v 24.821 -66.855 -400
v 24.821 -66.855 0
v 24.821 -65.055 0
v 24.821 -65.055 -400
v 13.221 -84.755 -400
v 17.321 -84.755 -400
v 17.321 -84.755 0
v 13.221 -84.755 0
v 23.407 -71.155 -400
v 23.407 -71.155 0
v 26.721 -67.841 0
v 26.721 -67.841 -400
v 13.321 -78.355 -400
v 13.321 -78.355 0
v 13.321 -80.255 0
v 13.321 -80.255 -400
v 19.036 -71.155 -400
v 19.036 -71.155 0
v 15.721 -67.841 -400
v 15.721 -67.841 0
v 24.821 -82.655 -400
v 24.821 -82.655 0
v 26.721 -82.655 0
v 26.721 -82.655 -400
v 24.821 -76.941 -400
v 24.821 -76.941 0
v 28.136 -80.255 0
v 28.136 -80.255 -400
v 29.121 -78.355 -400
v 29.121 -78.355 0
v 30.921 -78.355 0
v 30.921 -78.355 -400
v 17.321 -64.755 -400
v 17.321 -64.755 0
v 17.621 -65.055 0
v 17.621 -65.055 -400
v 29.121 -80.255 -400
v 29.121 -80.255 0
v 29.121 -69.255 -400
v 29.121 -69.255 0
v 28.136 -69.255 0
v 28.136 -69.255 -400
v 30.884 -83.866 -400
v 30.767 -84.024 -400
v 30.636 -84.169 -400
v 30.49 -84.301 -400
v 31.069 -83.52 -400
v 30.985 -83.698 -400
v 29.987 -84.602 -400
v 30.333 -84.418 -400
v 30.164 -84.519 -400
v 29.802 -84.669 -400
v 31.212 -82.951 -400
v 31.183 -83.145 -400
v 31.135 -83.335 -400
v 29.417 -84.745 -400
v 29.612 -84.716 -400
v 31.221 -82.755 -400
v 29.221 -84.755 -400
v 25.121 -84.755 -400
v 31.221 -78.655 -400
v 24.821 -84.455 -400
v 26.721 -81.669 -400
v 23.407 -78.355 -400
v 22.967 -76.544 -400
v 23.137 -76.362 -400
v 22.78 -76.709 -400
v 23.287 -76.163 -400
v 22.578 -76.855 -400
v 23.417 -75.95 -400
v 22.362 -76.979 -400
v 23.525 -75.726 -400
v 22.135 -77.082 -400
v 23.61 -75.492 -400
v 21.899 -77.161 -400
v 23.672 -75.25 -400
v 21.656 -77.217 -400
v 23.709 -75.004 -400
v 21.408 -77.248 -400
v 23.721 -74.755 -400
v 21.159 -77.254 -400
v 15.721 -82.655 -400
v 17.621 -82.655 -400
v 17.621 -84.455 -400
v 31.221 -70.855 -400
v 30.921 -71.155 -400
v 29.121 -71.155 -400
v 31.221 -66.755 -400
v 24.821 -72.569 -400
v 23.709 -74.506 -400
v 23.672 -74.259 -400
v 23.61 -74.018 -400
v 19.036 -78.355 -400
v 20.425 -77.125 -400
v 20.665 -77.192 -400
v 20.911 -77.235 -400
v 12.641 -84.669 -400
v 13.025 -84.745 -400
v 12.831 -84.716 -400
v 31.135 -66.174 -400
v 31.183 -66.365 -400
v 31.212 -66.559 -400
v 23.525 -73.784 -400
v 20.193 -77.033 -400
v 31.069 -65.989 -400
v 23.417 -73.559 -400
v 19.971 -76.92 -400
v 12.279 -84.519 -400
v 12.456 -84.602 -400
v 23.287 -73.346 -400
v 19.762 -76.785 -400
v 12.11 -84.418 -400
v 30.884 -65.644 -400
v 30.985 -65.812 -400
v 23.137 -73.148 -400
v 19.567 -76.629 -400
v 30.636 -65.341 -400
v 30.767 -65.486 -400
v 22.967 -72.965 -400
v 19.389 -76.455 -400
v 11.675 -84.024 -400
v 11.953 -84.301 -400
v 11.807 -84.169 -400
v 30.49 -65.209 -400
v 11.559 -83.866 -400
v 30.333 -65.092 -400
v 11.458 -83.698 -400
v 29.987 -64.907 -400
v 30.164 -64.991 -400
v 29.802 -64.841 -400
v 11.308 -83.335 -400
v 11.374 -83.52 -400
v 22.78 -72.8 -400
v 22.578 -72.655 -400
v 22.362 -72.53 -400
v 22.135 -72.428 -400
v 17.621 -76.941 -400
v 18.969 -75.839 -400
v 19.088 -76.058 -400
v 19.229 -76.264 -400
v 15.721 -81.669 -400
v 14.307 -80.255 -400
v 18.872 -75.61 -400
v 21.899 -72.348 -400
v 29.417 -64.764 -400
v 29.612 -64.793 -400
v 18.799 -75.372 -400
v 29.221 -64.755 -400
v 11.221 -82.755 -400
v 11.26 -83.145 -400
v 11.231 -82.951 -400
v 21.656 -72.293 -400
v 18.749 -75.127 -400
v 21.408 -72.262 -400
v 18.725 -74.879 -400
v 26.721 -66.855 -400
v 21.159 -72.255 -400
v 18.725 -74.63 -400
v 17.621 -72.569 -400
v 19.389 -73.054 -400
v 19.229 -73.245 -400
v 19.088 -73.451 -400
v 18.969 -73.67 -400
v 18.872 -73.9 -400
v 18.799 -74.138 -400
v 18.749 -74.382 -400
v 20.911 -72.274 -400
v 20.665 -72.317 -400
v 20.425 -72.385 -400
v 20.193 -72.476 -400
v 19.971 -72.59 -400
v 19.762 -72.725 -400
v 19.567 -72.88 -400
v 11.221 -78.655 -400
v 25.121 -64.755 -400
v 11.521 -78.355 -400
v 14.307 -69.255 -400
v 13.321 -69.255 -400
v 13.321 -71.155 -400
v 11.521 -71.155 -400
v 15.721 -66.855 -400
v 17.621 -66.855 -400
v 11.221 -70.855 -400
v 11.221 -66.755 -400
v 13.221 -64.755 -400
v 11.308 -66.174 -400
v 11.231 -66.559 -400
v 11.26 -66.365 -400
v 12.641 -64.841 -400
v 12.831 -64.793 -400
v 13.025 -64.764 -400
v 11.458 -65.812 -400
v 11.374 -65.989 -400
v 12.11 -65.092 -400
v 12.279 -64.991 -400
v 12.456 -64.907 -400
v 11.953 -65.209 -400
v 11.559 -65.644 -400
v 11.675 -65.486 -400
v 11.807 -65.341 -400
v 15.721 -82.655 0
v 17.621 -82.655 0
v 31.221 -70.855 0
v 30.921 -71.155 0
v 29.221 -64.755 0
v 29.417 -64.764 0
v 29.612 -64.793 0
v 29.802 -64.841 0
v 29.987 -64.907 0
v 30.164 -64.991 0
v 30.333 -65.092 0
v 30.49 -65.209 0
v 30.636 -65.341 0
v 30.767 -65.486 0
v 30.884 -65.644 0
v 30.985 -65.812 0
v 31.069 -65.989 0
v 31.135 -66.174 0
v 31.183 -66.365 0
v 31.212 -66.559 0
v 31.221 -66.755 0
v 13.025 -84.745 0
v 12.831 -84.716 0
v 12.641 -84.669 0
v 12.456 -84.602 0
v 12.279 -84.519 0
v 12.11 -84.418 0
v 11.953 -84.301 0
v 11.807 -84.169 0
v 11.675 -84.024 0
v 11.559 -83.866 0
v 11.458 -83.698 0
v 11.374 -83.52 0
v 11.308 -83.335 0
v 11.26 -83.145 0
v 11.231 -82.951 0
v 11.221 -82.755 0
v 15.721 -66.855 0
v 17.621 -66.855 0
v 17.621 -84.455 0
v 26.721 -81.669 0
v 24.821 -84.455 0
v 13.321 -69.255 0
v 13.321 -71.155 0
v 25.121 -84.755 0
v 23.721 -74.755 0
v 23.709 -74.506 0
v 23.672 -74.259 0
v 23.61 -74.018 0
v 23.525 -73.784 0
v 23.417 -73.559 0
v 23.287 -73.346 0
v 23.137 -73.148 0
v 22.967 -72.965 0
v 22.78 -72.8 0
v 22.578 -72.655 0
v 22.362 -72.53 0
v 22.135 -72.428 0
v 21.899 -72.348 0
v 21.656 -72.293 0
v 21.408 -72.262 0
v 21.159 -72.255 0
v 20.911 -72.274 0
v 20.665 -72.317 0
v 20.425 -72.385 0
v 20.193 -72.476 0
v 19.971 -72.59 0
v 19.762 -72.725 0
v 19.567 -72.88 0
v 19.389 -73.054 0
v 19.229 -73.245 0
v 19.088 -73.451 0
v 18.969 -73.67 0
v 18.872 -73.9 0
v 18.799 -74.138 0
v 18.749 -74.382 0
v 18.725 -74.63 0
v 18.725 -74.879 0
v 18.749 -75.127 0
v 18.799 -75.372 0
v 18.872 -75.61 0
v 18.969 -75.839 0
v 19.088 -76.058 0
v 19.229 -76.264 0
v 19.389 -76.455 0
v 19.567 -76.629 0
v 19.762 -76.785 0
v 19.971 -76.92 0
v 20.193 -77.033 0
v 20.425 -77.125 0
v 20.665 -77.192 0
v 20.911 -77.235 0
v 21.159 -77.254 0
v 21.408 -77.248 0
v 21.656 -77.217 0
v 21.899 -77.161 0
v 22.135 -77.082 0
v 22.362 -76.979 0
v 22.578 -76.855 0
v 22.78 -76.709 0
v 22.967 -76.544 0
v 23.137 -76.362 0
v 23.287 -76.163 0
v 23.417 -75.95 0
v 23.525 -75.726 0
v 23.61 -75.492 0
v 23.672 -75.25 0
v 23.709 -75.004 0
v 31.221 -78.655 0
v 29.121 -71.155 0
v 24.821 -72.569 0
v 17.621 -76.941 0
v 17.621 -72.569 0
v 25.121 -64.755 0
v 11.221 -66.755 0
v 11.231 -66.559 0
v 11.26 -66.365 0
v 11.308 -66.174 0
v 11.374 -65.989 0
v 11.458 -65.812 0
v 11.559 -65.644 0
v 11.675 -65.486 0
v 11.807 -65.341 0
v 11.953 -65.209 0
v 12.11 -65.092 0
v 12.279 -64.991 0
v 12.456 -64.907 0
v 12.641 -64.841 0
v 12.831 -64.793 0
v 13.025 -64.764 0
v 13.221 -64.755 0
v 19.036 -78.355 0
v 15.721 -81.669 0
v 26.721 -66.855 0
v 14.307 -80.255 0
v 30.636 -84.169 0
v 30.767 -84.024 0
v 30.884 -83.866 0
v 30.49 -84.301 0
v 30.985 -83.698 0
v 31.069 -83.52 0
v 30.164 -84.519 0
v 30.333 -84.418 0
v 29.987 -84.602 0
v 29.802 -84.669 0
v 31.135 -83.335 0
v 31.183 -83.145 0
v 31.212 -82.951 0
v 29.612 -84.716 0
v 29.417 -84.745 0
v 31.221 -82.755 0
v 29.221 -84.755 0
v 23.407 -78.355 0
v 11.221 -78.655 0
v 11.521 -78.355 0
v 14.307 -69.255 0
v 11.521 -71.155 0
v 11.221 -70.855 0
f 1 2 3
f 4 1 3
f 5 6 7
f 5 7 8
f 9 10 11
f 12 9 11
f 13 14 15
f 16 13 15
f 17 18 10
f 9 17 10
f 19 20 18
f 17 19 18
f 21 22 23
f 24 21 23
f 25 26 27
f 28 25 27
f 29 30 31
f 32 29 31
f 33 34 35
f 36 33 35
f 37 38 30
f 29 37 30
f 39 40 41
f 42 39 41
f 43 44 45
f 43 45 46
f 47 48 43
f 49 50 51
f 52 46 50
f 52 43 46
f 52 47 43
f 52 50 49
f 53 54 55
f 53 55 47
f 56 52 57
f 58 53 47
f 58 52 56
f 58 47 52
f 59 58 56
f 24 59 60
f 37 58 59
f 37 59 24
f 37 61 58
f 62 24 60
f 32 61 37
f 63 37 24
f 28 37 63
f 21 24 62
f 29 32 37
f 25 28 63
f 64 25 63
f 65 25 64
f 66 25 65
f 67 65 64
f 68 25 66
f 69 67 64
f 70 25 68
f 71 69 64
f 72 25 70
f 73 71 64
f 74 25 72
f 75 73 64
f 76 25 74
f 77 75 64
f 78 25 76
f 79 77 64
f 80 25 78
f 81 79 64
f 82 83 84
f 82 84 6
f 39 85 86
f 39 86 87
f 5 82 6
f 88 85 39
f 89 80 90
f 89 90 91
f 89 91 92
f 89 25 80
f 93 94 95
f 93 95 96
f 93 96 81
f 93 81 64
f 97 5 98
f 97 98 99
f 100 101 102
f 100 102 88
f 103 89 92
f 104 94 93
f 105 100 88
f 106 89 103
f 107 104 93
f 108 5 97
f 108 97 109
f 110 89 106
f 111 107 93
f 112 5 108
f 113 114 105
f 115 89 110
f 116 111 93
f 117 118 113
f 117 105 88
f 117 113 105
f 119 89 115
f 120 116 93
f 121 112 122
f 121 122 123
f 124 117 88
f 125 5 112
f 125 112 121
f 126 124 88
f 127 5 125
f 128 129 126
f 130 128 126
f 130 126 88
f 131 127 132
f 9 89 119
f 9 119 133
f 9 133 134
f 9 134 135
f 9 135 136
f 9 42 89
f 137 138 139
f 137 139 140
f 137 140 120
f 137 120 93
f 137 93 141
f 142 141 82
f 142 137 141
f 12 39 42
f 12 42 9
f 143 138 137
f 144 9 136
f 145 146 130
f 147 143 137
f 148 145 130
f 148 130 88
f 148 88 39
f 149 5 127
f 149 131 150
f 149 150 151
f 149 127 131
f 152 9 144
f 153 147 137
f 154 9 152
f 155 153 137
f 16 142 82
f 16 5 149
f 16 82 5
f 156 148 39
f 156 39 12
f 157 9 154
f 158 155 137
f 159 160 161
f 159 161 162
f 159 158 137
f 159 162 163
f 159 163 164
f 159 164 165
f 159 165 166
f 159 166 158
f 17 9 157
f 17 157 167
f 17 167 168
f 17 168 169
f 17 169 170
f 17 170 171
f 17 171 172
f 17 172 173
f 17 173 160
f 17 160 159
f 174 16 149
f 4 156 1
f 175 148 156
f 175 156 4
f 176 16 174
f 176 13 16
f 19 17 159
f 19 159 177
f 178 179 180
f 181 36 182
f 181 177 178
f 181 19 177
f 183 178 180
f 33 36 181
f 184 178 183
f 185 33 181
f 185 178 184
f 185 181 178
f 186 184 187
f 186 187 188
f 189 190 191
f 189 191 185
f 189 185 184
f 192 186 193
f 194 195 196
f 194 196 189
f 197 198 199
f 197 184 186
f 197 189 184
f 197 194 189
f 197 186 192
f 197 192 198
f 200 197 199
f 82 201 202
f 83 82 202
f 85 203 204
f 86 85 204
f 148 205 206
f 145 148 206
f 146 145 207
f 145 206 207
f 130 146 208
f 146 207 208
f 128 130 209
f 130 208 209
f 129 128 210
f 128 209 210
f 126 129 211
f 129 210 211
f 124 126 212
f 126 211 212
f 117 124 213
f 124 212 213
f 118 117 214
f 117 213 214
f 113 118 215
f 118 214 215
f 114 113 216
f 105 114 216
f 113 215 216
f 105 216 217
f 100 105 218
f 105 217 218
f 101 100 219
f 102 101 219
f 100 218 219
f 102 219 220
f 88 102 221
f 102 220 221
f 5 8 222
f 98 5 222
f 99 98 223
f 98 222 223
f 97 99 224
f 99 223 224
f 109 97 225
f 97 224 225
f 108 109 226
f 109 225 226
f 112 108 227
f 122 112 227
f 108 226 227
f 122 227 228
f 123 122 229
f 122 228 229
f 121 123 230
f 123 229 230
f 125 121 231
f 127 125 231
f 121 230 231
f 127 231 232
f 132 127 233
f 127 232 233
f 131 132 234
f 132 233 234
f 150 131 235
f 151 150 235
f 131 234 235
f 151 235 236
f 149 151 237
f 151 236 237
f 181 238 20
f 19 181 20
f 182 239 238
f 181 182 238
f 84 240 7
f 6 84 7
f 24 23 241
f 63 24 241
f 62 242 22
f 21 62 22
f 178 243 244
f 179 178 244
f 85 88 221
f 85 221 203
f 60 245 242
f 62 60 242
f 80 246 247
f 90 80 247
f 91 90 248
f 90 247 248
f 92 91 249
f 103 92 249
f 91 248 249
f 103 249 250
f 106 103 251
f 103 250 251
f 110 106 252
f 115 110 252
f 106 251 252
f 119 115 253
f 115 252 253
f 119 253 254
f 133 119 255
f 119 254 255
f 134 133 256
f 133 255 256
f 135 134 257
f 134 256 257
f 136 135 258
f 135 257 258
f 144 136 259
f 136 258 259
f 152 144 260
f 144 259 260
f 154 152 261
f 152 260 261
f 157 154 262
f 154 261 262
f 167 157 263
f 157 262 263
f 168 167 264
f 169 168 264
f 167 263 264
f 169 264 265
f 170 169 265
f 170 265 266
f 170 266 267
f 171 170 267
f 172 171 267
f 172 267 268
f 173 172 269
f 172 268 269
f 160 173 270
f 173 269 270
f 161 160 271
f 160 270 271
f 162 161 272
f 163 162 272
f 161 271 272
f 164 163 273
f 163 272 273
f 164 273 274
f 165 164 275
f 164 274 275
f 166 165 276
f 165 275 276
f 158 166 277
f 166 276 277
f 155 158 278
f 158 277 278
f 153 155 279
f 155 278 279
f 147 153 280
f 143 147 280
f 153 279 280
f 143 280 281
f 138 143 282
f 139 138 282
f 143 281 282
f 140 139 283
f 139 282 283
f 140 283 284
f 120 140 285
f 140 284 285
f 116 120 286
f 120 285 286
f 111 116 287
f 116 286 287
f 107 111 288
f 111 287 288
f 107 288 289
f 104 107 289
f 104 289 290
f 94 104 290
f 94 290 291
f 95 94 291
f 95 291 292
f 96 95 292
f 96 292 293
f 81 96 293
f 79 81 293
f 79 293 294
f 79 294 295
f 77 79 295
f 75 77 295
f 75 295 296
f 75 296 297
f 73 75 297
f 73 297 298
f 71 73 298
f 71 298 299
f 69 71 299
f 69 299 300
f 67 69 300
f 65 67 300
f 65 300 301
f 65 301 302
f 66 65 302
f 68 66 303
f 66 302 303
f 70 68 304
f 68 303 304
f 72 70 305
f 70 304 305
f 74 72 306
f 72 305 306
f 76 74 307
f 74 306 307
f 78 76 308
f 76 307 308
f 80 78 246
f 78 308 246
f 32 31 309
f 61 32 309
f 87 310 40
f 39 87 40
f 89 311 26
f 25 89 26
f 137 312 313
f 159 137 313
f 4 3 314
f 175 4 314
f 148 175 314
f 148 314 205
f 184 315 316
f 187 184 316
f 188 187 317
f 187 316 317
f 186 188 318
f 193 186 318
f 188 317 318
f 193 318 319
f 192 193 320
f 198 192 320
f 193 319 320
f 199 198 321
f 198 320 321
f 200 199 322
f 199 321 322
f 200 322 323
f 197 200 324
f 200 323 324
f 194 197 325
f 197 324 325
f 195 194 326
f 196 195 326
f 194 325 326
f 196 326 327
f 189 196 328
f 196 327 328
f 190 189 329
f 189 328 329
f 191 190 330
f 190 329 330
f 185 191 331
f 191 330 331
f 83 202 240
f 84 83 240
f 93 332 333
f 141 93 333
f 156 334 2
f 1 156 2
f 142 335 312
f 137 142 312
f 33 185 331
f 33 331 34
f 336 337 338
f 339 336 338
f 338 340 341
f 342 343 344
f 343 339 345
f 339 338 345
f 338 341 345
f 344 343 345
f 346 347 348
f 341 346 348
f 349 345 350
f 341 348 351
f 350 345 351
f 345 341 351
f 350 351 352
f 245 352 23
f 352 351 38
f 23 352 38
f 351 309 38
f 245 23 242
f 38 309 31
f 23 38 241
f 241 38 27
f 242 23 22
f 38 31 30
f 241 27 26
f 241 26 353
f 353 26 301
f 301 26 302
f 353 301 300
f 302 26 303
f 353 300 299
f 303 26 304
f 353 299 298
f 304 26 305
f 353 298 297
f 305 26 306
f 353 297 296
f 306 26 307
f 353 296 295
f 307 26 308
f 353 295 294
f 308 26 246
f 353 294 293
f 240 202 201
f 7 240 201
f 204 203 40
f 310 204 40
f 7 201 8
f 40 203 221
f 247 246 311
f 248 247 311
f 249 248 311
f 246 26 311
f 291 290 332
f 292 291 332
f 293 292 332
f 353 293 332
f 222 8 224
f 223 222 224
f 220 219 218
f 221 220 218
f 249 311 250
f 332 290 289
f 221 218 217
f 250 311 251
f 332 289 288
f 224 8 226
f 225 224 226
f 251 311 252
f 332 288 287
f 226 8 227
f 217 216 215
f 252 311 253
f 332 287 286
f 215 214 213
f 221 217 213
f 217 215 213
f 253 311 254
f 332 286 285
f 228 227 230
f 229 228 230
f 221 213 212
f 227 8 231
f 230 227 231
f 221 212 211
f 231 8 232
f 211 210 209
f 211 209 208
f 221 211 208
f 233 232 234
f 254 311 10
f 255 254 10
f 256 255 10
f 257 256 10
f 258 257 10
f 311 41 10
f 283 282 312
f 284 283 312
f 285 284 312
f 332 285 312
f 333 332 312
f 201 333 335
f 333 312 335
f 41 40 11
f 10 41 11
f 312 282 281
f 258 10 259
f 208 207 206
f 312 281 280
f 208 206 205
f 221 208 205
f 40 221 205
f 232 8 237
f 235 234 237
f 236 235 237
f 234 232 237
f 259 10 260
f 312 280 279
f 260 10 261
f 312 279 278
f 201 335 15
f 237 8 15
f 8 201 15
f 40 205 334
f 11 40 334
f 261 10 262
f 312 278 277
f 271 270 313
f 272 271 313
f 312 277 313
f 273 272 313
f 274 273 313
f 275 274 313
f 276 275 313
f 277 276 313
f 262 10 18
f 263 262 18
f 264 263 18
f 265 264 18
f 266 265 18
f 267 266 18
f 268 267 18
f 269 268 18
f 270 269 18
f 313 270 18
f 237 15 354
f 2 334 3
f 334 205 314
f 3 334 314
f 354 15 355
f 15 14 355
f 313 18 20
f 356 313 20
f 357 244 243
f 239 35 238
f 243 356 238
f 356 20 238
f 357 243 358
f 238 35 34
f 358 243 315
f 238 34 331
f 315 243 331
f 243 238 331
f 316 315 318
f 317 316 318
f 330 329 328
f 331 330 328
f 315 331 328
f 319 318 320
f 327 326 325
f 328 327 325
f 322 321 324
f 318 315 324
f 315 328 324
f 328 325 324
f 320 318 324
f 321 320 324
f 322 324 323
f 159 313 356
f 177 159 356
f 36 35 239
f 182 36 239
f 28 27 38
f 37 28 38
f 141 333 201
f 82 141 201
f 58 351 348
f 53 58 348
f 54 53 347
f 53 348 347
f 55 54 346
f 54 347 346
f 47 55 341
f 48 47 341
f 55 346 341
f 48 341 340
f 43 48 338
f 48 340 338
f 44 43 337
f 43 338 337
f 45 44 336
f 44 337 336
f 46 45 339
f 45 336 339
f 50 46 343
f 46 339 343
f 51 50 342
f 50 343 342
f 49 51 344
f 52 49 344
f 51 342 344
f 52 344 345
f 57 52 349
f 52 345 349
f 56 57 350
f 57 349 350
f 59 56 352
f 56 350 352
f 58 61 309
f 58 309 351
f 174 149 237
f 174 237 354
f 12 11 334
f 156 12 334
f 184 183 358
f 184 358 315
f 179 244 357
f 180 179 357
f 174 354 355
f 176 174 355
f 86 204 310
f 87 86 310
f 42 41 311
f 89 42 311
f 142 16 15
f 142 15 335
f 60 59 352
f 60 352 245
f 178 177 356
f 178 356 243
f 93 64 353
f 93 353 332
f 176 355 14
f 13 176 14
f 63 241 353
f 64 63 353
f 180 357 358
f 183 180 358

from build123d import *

# Parameters (mm, degrees)
SKETCH1_R           = 2.5
BOSS_EXTRUDE1_DEPTH = 400


with BuildPart() as part:
    # Sketch1 → Boss-Extrude1 (new body)
    with BuildSketch(Plane.XY):
        with BuildLine():
            Line((19.035670378, -71.15472155), (23.407243253, -71.15472155))
            Line((23.407243253, -71.15472155), (26.721456816, -67.840507987))
            Line((26.721456816, -67.840507987), (26.721456816, -66.85472155))
            Line((26.721456816, -66.85472155), (24.821456816, -66.85472155))
            Line((24.821456816, -66.85472155), (24.821456816, -65.05472155))
            Line((24.821456816, -65.05472155), (25.121456816, -64.75472155))
            Line((25.121456816, -64.75472155), (29.221456816, -64.75472155))
            ThreePointArc((29.221456816, -64.75472155), (30.635670378, -65.340507987), (31.221456816, -66.75472155))
            Line((31.221456816, -66.75472155), (31.221456816, -70.85472155))
            Line((31.221456816, -70.85472155), (30.921456816, -71.15472155))
            Line((30.921456816, -71.15472155), (29.121456816, -71.15472155))
            Line((29.121456816, -71.15472155), (29.121456816, -69.25472155))
            Line((29.121456816, -69.25472155), (28.135670378, -69.25472155))
            Line((28.135670378, -69.25472155), (24.821456816, -72.568935112))
            Line((24.821456816, -72.568935112), (24.821456816, -76.940507987))
            Line((24.821456816, -76.940507987), (28.135670378, -80.25472155))
            Line((28.135670378, -80.25472155), (29.121456816, -80.25472155))
            Line((29.121456816, -80.25472155), (29.121456816, -78.35472155))
            Line((29.121456816, -78.35472155), (30.921456816, -78.35472155))
            Line((30.921456816, -78.35472155), (31.221456816, -78.65472155))
            Line((31.221456816, -78.65472155), (31.221456816, -82.75472155))
            ThreePointArc((31.221456816, -82.75472155), (30.635670378, -84.168935112), (29.221456816, -84.75472155))
            Line((29.221456816, -84.75472155), (25.121456816, -84.75472155))
            Line((25.121456816, -84.75472155), (24.821456816, -84.45472155))
            Line((24.821456816, -84.45472155), (24.821456816, -82.65472155))
            Line((24.821456816, -82.65472155), (26.721456816, -82.65472155))
            Line((26.721456816, -82.65472155), (26.721456816, -81.668935112))
            Line((26.721456816, -81.668935112), (23.407243253, -78.35472155))
            Line((23.407243253, -78.35472155), (19.035670378, -78.35472155))
            Line((19.035670378, -78.35472155), (15.721456816, -81.668935112))
            Line((15.721456816, -81.668935112), (15.721456816, -82.65472155))
            Line((15.721456816, -82.65472155), (17.621456816, -82.65472155))
            Line((17.621456816, -82.65472155), (17.621456816, -84.45472155))
            Line((17.621456816, -84.45472155), (17.321456816, -84.75472155))
            Line((17.321456816, -84.75472155), (13.221456816, -84.75472155))
            ThreePointArc((13.221456816, -84.75472155), (11.807243253, -84.168935112), (11.221456816, -82.75472155))
            Line((11.221456816, -82.75472155), (11.221456816, -78.65472155))
            Line((11.221456816, -78.65472155), (11.521456816, -78.35472155))
            Line((11.521456816, -78.35472155), (13.321456816, -78.35472155))
            Line((13.321456816, -78.35472155), (13.321456816, -80.25472155))
            Line((13.321456816, -80.25472155), (14.307243253, -80.25472155))
            Line((14.307243253, -80.25472155), (17.621456816, -76.940507987))
            Line((17.621456816, -76.940507987), (17.621456816, -72.568935112))
            Line((17.621456816, -72.568935112), (14.307243253, -69.25472155))
            Line((14.307243253, -69.25472155), (13.321456816, -69.25472155))
            Line((13.321456816, -69.25472155), (13.321456816, -71.15472155))
            Line((13.321456816, -71.15472155), (11.521456816, -71.15472155))
            Line((11.521456816, -71.15472155), (11.221456816, -70.85472155))
            Line((11.221456816, -70.85472155), (11.221456816, -66.75472155))
            ThreePointArc((11.221456816, -66.75472155), (11.807243253, -65.340507987), (13.221456816, -64.75472155))
            Line((13.221456816, -64.75472155), (17.321456816, -64.75472155))
            Line((17.321456816, -64.75472155), (17.621456816, -65.05472155))
            Line((17.621456816, -65.05472155), (17.621456816, -66.85472155))
            Line((17.621456816, -66.85472155), (15.721456816, -66.85472155))
            Line((15.721456816, -66.85472155), (15.721456816, -67.840507987))
            Line((15.721456816, -67.840507987), (19.035670378, -71.15472155))
        make_face()
        with Locations((21.221456816, -74.75472155)):
            Circle(SKETCH1_R, mode=Mode.SUBTRACT)
    extrude(amount=-BOSS_EXTRUDE1_DEPTH)


solid = part.part
